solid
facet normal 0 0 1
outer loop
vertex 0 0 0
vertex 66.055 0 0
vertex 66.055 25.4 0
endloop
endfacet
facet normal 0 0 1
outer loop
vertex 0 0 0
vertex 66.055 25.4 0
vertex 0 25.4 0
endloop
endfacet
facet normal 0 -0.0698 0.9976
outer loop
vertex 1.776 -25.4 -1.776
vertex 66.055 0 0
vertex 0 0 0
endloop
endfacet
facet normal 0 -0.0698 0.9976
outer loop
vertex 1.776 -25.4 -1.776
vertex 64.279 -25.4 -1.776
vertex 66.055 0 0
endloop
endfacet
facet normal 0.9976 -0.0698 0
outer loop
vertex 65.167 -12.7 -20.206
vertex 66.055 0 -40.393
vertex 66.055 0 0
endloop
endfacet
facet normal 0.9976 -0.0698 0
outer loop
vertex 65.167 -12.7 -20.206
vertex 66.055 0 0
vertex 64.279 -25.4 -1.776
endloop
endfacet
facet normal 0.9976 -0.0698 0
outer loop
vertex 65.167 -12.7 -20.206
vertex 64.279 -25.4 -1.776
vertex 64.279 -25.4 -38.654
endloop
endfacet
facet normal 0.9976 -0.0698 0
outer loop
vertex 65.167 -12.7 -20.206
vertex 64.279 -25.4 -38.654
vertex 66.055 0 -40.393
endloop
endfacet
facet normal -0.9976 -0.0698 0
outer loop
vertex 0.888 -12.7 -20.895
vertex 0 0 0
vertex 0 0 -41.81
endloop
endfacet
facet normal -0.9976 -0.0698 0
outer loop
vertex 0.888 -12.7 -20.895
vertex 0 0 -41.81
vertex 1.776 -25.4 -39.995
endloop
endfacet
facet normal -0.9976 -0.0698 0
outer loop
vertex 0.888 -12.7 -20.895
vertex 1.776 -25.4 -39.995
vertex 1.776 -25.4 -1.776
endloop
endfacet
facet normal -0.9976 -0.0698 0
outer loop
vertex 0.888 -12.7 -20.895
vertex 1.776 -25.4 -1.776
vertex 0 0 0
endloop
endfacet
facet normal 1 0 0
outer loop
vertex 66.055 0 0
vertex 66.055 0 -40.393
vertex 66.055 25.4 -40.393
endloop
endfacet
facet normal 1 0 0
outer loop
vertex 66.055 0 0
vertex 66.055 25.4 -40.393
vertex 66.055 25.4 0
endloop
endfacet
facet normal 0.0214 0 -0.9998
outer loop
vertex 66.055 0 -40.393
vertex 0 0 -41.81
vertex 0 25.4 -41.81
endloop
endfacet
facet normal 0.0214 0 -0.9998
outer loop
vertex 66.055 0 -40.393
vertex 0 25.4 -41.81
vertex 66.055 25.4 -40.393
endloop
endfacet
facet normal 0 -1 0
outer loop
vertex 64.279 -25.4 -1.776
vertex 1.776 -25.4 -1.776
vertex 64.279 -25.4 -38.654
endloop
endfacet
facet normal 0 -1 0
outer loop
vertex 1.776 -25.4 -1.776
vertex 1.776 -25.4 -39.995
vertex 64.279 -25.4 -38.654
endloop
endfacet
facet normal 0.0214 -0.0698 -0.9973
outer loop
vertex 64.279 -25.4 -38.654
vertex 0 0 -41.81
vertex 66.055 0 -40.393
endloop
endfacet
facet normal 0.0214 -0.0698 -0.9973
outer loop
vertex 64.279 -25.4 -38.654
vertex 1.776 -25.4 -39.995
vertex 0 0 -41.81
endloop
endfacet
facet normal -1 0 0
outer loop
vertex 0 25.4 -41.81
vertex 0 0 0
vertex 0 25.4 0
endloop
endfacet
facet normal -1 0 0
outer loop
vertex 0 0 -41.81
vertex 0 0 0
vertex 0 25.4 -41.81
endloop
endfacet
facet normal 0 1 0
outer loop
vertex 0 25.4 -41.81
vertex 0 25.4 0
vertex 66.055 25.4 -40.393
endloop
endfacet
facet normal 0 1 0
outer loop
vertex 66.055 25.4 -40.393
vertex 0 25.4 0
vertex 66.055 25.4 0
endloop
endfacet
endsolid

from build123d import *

# Parameters (mm, degrees)
F1_DEPTH      = 25.4
F1_TAPER      = 4
F1_DEPTH_BACK = 25.4


with BuildPart() as f1:
    # F0 (on Front) → F1 (new body, two sides)
    with BuildSketch(Plane.XZ) as f1_sk:
        Polygon((0, 0), (0, -41.8099462986), (66.0554021597, -40.3928682208), (66.0554021597, 0), align=None)
    extrude(amount=F1_DEPTH, taper=F1_TAPER)
    extrude(f1_sk.sketch, amount=-F1_DEPTH_BACK)


solid = f1.part
